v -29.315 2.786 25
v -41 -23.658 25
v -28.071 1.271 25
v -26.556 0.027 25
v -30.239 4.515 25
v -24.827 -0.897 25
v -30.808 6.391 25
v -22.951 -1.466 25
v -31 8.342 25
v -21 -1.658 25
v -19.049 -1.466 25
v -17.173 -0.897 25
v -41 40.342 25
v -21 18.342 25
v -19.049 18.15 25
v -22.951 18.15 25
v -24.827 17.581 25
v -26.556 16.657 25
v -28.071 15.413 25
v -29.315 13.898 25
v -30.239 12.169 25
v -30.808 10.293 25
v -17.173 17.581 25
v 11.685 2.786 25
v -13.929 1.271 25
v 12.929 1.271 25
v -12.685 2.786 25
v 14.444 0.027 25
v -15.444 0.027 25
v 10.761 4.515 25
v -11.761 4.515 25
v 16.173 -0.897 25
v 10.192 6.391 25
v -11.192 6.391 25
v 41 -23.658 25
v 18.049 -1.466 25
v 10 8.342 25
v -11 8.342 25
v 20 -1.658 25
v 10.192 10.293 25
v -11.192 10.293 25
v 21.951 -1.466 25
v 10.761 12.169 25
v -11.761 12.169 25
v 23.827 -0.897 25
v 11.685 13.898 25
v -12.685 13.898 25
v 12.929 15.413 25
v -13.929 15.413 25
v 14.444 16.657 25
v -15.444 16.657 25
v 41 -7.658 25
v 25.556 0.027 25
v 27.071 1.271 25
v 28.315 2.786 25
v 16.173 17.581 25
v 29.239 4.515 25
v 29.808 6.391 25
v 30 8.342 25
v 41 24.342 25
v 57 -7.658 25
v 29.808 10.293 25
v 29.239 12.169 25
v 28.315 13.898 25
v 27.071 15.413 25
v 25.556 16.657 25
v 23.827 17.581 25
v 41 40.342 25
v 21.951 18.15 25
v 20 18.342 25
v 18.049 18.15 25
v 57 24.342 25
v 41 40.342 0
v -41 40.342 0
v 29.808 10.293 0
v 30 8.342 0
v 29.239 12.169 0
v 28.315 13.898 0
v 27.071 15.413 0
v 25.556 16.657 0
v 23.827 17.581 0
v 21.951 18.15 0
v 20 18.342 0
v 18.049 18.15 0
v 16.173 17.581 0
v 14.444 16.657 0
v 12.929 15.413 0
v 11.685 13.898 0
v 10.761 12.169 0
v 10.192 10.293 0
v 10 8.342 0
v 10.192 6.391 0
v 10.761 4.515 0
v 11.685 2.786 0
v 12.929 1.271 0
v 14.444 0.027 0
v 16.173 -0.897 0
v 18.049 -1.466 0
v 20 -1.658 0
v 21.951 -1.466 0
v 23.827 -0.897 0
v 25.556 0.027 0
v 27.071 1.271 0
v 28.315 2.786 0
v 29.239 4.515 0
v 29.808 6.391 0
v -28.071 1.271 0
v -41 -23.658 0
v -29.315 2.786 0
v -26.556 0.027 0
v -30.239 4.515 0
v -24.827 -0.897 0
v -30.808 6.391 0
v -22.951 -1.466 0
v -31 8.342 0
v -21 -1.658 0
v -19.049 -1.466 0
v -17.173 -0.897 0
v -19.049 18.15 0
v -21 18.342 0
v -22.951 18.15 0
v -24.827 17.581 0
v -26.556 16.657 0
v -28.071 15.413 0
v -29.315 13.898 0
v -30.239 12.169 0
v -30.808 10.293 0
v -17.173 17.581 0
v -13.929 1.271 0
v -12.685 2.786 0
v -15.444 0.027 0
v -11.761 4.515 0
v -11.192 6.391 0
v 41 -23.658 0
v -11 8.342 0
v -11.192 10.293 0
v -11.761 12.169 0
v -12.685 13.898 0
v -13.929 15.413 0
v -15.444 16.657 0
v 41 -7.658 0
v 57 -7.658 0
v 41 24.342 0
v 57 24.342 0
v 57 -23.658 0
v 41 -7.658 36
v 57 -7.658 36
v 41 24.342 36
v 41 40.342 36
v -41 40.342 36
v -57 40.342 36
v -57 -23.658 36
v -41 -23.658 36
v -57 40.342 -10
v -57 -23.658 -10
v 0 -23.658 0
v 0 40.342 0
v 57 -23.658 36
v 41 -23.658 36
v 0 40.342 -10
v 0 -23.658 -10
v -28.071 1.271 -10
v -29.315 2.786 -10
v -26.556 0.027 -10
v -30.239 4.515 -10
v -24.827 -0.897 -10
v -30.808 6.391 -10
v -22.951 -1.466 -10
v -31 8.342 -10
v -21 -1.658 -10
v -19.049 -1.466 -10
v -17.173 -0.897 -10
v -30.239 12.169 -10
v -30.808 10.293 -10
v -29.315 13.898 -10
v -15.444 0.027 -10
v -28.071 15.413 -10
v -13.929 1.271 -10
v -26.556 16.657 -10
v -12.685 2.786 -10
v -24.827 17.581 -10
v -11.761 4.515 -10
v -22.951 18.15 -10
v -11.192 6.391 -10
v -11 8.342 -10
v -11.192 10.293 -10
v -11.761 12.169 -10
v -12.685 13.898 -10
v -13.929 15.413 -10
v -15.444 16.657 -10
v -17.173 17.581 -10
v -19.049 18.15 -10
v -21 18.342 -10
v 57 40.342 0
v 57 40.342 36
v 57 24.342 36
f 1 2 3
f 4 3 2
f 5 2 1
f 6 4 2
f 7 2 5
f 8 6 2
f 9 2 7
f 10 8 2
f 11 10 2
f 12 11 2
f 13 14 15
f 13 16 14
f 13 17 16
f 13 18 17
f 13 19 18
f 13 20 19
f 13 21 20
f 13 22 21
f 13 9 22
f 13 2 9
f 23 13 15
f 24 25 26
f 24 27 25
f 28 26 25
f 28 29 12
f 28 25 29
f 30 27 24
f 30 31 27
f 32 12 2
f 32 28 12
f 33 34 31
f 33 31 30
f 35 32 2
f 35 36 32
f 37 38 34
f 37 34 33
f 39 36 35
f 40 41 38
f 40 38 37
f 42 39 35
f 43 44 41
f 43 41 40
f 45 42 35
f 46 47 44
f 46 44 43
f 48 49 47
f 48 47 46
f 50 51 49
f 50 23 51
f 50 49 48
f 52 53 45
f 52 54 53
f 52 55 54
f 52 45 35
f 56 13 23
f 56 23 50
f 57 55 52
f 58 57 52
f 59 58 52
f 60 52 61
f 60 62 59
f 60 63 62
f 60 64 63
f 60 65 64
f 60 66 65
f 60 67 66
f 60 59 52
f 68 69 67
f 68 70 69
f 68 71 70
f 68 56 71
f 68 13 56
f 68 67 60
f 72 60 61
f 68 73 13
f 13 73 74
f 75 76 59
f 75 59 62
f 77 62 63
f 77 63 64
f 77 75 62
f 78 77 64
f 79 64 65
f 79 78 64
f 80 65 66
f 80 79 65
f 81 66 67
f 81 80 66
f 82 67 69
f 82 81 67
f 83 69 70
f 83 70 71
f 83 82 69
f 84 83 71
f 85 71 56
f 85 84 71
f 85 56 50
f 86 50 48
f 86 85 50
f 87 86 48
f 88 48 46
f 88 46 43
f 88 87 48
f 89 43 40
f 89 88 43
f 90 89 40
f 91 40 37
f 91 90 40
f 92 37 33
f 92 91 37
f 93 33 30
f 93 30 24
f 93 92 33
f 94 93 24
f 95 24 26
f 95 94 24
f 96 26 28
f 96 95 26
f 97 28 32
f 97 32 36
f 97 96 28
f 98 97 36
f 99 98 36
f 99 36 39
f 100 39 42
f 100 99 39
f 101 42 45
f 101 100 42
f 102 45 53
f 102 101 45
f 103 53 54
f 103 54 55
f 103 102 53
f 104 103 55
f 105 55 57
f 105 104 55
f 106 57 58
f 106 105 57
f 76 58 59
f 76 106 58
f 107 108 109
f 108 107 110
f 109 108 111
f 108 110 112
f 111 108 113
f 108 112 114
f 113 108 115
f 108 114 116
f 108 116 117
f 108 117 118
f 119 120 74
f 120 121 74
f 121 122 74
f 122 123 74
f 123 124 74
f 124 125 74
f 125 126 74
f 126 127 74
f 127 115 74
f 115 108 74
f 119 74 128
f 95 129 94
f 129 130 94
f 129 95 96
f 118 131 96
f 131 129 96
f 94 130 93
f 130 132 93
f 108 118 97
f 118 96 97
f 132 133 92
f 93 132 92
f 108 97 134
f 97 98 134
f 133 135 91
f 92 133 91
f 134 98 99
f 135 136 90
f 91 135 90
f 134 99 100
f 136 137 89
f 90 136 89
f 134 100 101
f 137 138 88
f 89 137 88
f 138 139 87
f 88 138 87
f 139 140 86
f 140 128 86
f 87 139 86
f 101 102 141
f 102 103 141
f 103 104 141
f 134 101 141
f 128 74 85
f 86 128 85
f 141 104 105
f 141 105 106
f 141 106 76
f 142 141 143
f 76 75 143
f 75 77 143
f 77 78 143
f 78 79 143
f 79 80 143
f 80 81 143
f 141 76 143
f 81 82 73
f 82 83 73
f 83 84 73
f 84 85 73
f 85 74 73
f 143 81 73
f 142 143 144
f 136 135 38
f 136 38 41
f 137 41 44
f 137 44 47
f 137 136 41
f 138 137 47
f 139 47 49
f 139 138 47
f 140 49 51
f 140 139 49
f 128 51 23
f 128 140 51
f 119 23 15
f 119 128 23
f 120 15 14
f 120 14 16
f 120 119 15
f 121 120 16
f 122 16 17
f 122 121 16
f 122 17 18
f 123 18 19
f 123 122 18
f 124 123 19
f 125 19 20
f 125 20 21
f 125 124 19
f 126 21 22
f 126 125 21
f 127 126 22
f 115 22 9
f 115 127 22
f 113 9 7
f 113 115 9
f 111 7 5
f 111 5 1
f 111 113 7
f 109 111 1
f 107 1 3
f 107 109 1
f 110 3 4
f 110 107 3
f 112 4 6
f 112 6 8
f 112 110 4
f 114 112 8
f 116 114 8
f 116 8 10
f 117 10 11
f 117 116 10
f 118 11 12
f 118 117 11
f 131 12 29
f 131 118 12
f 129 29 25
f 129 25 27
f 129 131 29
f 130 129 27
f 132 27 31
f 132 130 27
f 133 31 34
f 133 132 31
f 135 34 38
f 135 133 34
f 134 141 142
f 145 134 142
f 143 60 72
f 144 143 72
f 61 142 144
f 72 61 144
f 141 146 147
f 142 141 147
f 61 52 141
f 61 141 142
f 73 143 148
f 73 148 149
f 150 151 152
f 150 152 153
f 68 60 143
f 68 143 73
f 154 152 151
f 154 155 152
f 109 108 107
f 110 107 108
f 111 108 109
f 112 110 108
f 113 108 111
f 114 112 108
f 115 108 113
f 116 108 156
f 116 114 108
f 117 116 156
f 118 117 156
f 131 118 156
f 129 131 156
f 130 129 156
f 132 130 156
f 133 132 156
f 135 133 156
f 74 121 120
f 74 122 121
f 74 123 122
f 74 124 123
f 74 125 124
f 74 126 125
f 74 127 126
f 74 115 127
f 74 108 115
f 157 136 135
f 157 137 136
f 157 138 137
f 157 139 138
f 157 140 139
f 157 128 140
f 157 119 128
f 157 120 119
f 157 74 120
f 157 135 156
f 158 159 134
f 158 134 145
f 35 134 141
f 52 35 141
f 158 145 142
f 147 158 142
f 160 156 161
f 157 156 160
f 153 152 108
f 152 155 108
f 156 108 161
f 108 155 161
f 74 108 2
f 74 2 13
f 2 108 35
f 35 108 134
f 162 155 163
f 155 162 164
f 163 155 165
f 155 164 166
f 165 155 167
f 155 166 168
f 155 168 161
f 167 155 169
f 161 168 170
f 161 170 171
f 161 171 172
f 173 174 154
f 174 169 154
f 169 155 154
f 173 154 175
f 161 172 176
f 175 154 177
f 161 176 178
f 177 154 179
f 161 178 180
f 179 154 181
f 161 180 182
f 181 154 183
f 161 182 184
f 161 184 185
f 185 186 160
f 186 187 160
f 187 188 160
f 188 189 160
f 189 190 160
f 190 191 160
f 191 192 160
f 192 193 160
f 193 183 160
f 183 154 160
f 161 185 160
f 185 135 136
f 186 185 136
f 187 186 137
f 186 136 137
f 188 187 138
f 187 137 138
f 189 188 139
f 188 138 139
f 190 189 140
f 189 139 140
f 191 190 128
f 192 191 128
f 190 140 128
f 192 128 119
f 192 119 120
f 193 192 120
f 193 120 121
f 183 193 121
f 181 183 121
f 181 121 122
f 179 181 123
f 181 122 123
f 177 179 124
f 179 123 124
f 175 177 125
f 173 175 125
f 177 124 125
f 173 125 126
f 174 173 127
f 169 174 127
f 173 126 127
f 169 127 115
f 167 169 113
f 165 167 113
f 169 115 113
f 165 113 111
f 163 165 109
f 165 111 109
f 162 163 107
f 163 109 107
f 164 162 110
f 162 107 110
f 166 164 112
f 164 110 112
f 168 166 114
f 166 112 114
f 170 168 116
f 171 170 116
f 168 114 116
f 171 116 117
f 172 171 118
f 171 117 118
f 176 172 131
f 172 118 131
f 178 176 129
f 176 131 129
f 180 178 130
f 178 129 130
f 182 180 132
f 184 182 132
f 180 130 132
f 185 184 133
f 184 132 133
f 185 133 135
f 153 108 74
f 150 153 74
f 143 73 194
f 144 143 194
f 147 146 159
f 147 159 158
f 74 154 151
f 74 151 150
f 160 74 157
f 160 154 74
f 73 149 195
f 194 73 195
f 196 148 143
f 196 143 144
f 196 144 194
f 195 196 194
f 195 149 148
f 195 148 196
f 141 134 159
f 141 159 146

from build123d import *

# Parameters (mm, degrees)
F0_W     = 41
F0_H     = 64
F0_R     = 10
F0_W_2   = 16
F1_DEPTH = 10
F0_H_2   = 16
F2_DEPTH = 36
F0_H_3   = 32
F3_DEPTH = 25


with BuildPart() as f1:
    # F0 (on Top) → F1 (new body)
    with BuildSketch(Plane.XY):
        with Locations((-20.5, 8.3420926728)):
            Rectangle(F0_W, F0_H)
        with Locations((-21, 8.3420926728)):
            Circle(F0_R, mode=Mode.SUBTRACT)
        with Locations((-49, 8.3420926728)):
            Rectangle(F0_W_2, F0_H)
    extrude(amount=-F1_DEPTH)

    # F0 (on Top) → F2, piece 3 (join)
    with BuildSketch(Plane.XY):
        with Locations((-49, 8.3420926728)):
            Rectangle(F0_W_2, F0_H)
    extrude(amount=F2_DEPTH)


with BuildPart() as f2:
    # F0 (on Top) → F2 (new body)
    with BuildSketch(Plane.XY):
        with Locations((49, 32.3420926728)):
            Rectangle(F0_W_2, F0_H_2)
    extrude(amount=F2_DEPTH)


with BuildPart() as f2b:
    # F0 (on Top) → F2, piece 2 (new body)
    with BuildSketch(Plane.XY):
        with Locations((49, -15.6579073272)):
            Rectangle(F0_W_2, F0_H_2)
    extrude(amount=F2_DEPTH)


with BuildPart() as f3:
    # F0 (on Top) → F3 (new body)
    with BuildSketch(Plane.XY):
        with Locations((-20.5, 8.3420926728)):
            Rectangle(F0_W, F0_H)
        with Locations((-21, 8.3420926728)):
            Circle(F0_R, mode=Mode.SUBTRACT)
        Polygon((0, 40.3420926728), (0, -23.6579073272), (41, -23.6579073272), (41, -7.6579073272), (41, 24.3420926728), (41, 40.3420926728), align=None)
        with Locations((20, 8.3420926728)):
            Circle(F0_R, mode=Mode.SUBTRACT)
        with Locations((49, 8.3420926728)):
            Rectangle(F0_W_2, F0_H_3)
    extrude(amount=F3_DEPTH)


solid = Compound([f1.part, f2.part, f2b.part, f3.part])
